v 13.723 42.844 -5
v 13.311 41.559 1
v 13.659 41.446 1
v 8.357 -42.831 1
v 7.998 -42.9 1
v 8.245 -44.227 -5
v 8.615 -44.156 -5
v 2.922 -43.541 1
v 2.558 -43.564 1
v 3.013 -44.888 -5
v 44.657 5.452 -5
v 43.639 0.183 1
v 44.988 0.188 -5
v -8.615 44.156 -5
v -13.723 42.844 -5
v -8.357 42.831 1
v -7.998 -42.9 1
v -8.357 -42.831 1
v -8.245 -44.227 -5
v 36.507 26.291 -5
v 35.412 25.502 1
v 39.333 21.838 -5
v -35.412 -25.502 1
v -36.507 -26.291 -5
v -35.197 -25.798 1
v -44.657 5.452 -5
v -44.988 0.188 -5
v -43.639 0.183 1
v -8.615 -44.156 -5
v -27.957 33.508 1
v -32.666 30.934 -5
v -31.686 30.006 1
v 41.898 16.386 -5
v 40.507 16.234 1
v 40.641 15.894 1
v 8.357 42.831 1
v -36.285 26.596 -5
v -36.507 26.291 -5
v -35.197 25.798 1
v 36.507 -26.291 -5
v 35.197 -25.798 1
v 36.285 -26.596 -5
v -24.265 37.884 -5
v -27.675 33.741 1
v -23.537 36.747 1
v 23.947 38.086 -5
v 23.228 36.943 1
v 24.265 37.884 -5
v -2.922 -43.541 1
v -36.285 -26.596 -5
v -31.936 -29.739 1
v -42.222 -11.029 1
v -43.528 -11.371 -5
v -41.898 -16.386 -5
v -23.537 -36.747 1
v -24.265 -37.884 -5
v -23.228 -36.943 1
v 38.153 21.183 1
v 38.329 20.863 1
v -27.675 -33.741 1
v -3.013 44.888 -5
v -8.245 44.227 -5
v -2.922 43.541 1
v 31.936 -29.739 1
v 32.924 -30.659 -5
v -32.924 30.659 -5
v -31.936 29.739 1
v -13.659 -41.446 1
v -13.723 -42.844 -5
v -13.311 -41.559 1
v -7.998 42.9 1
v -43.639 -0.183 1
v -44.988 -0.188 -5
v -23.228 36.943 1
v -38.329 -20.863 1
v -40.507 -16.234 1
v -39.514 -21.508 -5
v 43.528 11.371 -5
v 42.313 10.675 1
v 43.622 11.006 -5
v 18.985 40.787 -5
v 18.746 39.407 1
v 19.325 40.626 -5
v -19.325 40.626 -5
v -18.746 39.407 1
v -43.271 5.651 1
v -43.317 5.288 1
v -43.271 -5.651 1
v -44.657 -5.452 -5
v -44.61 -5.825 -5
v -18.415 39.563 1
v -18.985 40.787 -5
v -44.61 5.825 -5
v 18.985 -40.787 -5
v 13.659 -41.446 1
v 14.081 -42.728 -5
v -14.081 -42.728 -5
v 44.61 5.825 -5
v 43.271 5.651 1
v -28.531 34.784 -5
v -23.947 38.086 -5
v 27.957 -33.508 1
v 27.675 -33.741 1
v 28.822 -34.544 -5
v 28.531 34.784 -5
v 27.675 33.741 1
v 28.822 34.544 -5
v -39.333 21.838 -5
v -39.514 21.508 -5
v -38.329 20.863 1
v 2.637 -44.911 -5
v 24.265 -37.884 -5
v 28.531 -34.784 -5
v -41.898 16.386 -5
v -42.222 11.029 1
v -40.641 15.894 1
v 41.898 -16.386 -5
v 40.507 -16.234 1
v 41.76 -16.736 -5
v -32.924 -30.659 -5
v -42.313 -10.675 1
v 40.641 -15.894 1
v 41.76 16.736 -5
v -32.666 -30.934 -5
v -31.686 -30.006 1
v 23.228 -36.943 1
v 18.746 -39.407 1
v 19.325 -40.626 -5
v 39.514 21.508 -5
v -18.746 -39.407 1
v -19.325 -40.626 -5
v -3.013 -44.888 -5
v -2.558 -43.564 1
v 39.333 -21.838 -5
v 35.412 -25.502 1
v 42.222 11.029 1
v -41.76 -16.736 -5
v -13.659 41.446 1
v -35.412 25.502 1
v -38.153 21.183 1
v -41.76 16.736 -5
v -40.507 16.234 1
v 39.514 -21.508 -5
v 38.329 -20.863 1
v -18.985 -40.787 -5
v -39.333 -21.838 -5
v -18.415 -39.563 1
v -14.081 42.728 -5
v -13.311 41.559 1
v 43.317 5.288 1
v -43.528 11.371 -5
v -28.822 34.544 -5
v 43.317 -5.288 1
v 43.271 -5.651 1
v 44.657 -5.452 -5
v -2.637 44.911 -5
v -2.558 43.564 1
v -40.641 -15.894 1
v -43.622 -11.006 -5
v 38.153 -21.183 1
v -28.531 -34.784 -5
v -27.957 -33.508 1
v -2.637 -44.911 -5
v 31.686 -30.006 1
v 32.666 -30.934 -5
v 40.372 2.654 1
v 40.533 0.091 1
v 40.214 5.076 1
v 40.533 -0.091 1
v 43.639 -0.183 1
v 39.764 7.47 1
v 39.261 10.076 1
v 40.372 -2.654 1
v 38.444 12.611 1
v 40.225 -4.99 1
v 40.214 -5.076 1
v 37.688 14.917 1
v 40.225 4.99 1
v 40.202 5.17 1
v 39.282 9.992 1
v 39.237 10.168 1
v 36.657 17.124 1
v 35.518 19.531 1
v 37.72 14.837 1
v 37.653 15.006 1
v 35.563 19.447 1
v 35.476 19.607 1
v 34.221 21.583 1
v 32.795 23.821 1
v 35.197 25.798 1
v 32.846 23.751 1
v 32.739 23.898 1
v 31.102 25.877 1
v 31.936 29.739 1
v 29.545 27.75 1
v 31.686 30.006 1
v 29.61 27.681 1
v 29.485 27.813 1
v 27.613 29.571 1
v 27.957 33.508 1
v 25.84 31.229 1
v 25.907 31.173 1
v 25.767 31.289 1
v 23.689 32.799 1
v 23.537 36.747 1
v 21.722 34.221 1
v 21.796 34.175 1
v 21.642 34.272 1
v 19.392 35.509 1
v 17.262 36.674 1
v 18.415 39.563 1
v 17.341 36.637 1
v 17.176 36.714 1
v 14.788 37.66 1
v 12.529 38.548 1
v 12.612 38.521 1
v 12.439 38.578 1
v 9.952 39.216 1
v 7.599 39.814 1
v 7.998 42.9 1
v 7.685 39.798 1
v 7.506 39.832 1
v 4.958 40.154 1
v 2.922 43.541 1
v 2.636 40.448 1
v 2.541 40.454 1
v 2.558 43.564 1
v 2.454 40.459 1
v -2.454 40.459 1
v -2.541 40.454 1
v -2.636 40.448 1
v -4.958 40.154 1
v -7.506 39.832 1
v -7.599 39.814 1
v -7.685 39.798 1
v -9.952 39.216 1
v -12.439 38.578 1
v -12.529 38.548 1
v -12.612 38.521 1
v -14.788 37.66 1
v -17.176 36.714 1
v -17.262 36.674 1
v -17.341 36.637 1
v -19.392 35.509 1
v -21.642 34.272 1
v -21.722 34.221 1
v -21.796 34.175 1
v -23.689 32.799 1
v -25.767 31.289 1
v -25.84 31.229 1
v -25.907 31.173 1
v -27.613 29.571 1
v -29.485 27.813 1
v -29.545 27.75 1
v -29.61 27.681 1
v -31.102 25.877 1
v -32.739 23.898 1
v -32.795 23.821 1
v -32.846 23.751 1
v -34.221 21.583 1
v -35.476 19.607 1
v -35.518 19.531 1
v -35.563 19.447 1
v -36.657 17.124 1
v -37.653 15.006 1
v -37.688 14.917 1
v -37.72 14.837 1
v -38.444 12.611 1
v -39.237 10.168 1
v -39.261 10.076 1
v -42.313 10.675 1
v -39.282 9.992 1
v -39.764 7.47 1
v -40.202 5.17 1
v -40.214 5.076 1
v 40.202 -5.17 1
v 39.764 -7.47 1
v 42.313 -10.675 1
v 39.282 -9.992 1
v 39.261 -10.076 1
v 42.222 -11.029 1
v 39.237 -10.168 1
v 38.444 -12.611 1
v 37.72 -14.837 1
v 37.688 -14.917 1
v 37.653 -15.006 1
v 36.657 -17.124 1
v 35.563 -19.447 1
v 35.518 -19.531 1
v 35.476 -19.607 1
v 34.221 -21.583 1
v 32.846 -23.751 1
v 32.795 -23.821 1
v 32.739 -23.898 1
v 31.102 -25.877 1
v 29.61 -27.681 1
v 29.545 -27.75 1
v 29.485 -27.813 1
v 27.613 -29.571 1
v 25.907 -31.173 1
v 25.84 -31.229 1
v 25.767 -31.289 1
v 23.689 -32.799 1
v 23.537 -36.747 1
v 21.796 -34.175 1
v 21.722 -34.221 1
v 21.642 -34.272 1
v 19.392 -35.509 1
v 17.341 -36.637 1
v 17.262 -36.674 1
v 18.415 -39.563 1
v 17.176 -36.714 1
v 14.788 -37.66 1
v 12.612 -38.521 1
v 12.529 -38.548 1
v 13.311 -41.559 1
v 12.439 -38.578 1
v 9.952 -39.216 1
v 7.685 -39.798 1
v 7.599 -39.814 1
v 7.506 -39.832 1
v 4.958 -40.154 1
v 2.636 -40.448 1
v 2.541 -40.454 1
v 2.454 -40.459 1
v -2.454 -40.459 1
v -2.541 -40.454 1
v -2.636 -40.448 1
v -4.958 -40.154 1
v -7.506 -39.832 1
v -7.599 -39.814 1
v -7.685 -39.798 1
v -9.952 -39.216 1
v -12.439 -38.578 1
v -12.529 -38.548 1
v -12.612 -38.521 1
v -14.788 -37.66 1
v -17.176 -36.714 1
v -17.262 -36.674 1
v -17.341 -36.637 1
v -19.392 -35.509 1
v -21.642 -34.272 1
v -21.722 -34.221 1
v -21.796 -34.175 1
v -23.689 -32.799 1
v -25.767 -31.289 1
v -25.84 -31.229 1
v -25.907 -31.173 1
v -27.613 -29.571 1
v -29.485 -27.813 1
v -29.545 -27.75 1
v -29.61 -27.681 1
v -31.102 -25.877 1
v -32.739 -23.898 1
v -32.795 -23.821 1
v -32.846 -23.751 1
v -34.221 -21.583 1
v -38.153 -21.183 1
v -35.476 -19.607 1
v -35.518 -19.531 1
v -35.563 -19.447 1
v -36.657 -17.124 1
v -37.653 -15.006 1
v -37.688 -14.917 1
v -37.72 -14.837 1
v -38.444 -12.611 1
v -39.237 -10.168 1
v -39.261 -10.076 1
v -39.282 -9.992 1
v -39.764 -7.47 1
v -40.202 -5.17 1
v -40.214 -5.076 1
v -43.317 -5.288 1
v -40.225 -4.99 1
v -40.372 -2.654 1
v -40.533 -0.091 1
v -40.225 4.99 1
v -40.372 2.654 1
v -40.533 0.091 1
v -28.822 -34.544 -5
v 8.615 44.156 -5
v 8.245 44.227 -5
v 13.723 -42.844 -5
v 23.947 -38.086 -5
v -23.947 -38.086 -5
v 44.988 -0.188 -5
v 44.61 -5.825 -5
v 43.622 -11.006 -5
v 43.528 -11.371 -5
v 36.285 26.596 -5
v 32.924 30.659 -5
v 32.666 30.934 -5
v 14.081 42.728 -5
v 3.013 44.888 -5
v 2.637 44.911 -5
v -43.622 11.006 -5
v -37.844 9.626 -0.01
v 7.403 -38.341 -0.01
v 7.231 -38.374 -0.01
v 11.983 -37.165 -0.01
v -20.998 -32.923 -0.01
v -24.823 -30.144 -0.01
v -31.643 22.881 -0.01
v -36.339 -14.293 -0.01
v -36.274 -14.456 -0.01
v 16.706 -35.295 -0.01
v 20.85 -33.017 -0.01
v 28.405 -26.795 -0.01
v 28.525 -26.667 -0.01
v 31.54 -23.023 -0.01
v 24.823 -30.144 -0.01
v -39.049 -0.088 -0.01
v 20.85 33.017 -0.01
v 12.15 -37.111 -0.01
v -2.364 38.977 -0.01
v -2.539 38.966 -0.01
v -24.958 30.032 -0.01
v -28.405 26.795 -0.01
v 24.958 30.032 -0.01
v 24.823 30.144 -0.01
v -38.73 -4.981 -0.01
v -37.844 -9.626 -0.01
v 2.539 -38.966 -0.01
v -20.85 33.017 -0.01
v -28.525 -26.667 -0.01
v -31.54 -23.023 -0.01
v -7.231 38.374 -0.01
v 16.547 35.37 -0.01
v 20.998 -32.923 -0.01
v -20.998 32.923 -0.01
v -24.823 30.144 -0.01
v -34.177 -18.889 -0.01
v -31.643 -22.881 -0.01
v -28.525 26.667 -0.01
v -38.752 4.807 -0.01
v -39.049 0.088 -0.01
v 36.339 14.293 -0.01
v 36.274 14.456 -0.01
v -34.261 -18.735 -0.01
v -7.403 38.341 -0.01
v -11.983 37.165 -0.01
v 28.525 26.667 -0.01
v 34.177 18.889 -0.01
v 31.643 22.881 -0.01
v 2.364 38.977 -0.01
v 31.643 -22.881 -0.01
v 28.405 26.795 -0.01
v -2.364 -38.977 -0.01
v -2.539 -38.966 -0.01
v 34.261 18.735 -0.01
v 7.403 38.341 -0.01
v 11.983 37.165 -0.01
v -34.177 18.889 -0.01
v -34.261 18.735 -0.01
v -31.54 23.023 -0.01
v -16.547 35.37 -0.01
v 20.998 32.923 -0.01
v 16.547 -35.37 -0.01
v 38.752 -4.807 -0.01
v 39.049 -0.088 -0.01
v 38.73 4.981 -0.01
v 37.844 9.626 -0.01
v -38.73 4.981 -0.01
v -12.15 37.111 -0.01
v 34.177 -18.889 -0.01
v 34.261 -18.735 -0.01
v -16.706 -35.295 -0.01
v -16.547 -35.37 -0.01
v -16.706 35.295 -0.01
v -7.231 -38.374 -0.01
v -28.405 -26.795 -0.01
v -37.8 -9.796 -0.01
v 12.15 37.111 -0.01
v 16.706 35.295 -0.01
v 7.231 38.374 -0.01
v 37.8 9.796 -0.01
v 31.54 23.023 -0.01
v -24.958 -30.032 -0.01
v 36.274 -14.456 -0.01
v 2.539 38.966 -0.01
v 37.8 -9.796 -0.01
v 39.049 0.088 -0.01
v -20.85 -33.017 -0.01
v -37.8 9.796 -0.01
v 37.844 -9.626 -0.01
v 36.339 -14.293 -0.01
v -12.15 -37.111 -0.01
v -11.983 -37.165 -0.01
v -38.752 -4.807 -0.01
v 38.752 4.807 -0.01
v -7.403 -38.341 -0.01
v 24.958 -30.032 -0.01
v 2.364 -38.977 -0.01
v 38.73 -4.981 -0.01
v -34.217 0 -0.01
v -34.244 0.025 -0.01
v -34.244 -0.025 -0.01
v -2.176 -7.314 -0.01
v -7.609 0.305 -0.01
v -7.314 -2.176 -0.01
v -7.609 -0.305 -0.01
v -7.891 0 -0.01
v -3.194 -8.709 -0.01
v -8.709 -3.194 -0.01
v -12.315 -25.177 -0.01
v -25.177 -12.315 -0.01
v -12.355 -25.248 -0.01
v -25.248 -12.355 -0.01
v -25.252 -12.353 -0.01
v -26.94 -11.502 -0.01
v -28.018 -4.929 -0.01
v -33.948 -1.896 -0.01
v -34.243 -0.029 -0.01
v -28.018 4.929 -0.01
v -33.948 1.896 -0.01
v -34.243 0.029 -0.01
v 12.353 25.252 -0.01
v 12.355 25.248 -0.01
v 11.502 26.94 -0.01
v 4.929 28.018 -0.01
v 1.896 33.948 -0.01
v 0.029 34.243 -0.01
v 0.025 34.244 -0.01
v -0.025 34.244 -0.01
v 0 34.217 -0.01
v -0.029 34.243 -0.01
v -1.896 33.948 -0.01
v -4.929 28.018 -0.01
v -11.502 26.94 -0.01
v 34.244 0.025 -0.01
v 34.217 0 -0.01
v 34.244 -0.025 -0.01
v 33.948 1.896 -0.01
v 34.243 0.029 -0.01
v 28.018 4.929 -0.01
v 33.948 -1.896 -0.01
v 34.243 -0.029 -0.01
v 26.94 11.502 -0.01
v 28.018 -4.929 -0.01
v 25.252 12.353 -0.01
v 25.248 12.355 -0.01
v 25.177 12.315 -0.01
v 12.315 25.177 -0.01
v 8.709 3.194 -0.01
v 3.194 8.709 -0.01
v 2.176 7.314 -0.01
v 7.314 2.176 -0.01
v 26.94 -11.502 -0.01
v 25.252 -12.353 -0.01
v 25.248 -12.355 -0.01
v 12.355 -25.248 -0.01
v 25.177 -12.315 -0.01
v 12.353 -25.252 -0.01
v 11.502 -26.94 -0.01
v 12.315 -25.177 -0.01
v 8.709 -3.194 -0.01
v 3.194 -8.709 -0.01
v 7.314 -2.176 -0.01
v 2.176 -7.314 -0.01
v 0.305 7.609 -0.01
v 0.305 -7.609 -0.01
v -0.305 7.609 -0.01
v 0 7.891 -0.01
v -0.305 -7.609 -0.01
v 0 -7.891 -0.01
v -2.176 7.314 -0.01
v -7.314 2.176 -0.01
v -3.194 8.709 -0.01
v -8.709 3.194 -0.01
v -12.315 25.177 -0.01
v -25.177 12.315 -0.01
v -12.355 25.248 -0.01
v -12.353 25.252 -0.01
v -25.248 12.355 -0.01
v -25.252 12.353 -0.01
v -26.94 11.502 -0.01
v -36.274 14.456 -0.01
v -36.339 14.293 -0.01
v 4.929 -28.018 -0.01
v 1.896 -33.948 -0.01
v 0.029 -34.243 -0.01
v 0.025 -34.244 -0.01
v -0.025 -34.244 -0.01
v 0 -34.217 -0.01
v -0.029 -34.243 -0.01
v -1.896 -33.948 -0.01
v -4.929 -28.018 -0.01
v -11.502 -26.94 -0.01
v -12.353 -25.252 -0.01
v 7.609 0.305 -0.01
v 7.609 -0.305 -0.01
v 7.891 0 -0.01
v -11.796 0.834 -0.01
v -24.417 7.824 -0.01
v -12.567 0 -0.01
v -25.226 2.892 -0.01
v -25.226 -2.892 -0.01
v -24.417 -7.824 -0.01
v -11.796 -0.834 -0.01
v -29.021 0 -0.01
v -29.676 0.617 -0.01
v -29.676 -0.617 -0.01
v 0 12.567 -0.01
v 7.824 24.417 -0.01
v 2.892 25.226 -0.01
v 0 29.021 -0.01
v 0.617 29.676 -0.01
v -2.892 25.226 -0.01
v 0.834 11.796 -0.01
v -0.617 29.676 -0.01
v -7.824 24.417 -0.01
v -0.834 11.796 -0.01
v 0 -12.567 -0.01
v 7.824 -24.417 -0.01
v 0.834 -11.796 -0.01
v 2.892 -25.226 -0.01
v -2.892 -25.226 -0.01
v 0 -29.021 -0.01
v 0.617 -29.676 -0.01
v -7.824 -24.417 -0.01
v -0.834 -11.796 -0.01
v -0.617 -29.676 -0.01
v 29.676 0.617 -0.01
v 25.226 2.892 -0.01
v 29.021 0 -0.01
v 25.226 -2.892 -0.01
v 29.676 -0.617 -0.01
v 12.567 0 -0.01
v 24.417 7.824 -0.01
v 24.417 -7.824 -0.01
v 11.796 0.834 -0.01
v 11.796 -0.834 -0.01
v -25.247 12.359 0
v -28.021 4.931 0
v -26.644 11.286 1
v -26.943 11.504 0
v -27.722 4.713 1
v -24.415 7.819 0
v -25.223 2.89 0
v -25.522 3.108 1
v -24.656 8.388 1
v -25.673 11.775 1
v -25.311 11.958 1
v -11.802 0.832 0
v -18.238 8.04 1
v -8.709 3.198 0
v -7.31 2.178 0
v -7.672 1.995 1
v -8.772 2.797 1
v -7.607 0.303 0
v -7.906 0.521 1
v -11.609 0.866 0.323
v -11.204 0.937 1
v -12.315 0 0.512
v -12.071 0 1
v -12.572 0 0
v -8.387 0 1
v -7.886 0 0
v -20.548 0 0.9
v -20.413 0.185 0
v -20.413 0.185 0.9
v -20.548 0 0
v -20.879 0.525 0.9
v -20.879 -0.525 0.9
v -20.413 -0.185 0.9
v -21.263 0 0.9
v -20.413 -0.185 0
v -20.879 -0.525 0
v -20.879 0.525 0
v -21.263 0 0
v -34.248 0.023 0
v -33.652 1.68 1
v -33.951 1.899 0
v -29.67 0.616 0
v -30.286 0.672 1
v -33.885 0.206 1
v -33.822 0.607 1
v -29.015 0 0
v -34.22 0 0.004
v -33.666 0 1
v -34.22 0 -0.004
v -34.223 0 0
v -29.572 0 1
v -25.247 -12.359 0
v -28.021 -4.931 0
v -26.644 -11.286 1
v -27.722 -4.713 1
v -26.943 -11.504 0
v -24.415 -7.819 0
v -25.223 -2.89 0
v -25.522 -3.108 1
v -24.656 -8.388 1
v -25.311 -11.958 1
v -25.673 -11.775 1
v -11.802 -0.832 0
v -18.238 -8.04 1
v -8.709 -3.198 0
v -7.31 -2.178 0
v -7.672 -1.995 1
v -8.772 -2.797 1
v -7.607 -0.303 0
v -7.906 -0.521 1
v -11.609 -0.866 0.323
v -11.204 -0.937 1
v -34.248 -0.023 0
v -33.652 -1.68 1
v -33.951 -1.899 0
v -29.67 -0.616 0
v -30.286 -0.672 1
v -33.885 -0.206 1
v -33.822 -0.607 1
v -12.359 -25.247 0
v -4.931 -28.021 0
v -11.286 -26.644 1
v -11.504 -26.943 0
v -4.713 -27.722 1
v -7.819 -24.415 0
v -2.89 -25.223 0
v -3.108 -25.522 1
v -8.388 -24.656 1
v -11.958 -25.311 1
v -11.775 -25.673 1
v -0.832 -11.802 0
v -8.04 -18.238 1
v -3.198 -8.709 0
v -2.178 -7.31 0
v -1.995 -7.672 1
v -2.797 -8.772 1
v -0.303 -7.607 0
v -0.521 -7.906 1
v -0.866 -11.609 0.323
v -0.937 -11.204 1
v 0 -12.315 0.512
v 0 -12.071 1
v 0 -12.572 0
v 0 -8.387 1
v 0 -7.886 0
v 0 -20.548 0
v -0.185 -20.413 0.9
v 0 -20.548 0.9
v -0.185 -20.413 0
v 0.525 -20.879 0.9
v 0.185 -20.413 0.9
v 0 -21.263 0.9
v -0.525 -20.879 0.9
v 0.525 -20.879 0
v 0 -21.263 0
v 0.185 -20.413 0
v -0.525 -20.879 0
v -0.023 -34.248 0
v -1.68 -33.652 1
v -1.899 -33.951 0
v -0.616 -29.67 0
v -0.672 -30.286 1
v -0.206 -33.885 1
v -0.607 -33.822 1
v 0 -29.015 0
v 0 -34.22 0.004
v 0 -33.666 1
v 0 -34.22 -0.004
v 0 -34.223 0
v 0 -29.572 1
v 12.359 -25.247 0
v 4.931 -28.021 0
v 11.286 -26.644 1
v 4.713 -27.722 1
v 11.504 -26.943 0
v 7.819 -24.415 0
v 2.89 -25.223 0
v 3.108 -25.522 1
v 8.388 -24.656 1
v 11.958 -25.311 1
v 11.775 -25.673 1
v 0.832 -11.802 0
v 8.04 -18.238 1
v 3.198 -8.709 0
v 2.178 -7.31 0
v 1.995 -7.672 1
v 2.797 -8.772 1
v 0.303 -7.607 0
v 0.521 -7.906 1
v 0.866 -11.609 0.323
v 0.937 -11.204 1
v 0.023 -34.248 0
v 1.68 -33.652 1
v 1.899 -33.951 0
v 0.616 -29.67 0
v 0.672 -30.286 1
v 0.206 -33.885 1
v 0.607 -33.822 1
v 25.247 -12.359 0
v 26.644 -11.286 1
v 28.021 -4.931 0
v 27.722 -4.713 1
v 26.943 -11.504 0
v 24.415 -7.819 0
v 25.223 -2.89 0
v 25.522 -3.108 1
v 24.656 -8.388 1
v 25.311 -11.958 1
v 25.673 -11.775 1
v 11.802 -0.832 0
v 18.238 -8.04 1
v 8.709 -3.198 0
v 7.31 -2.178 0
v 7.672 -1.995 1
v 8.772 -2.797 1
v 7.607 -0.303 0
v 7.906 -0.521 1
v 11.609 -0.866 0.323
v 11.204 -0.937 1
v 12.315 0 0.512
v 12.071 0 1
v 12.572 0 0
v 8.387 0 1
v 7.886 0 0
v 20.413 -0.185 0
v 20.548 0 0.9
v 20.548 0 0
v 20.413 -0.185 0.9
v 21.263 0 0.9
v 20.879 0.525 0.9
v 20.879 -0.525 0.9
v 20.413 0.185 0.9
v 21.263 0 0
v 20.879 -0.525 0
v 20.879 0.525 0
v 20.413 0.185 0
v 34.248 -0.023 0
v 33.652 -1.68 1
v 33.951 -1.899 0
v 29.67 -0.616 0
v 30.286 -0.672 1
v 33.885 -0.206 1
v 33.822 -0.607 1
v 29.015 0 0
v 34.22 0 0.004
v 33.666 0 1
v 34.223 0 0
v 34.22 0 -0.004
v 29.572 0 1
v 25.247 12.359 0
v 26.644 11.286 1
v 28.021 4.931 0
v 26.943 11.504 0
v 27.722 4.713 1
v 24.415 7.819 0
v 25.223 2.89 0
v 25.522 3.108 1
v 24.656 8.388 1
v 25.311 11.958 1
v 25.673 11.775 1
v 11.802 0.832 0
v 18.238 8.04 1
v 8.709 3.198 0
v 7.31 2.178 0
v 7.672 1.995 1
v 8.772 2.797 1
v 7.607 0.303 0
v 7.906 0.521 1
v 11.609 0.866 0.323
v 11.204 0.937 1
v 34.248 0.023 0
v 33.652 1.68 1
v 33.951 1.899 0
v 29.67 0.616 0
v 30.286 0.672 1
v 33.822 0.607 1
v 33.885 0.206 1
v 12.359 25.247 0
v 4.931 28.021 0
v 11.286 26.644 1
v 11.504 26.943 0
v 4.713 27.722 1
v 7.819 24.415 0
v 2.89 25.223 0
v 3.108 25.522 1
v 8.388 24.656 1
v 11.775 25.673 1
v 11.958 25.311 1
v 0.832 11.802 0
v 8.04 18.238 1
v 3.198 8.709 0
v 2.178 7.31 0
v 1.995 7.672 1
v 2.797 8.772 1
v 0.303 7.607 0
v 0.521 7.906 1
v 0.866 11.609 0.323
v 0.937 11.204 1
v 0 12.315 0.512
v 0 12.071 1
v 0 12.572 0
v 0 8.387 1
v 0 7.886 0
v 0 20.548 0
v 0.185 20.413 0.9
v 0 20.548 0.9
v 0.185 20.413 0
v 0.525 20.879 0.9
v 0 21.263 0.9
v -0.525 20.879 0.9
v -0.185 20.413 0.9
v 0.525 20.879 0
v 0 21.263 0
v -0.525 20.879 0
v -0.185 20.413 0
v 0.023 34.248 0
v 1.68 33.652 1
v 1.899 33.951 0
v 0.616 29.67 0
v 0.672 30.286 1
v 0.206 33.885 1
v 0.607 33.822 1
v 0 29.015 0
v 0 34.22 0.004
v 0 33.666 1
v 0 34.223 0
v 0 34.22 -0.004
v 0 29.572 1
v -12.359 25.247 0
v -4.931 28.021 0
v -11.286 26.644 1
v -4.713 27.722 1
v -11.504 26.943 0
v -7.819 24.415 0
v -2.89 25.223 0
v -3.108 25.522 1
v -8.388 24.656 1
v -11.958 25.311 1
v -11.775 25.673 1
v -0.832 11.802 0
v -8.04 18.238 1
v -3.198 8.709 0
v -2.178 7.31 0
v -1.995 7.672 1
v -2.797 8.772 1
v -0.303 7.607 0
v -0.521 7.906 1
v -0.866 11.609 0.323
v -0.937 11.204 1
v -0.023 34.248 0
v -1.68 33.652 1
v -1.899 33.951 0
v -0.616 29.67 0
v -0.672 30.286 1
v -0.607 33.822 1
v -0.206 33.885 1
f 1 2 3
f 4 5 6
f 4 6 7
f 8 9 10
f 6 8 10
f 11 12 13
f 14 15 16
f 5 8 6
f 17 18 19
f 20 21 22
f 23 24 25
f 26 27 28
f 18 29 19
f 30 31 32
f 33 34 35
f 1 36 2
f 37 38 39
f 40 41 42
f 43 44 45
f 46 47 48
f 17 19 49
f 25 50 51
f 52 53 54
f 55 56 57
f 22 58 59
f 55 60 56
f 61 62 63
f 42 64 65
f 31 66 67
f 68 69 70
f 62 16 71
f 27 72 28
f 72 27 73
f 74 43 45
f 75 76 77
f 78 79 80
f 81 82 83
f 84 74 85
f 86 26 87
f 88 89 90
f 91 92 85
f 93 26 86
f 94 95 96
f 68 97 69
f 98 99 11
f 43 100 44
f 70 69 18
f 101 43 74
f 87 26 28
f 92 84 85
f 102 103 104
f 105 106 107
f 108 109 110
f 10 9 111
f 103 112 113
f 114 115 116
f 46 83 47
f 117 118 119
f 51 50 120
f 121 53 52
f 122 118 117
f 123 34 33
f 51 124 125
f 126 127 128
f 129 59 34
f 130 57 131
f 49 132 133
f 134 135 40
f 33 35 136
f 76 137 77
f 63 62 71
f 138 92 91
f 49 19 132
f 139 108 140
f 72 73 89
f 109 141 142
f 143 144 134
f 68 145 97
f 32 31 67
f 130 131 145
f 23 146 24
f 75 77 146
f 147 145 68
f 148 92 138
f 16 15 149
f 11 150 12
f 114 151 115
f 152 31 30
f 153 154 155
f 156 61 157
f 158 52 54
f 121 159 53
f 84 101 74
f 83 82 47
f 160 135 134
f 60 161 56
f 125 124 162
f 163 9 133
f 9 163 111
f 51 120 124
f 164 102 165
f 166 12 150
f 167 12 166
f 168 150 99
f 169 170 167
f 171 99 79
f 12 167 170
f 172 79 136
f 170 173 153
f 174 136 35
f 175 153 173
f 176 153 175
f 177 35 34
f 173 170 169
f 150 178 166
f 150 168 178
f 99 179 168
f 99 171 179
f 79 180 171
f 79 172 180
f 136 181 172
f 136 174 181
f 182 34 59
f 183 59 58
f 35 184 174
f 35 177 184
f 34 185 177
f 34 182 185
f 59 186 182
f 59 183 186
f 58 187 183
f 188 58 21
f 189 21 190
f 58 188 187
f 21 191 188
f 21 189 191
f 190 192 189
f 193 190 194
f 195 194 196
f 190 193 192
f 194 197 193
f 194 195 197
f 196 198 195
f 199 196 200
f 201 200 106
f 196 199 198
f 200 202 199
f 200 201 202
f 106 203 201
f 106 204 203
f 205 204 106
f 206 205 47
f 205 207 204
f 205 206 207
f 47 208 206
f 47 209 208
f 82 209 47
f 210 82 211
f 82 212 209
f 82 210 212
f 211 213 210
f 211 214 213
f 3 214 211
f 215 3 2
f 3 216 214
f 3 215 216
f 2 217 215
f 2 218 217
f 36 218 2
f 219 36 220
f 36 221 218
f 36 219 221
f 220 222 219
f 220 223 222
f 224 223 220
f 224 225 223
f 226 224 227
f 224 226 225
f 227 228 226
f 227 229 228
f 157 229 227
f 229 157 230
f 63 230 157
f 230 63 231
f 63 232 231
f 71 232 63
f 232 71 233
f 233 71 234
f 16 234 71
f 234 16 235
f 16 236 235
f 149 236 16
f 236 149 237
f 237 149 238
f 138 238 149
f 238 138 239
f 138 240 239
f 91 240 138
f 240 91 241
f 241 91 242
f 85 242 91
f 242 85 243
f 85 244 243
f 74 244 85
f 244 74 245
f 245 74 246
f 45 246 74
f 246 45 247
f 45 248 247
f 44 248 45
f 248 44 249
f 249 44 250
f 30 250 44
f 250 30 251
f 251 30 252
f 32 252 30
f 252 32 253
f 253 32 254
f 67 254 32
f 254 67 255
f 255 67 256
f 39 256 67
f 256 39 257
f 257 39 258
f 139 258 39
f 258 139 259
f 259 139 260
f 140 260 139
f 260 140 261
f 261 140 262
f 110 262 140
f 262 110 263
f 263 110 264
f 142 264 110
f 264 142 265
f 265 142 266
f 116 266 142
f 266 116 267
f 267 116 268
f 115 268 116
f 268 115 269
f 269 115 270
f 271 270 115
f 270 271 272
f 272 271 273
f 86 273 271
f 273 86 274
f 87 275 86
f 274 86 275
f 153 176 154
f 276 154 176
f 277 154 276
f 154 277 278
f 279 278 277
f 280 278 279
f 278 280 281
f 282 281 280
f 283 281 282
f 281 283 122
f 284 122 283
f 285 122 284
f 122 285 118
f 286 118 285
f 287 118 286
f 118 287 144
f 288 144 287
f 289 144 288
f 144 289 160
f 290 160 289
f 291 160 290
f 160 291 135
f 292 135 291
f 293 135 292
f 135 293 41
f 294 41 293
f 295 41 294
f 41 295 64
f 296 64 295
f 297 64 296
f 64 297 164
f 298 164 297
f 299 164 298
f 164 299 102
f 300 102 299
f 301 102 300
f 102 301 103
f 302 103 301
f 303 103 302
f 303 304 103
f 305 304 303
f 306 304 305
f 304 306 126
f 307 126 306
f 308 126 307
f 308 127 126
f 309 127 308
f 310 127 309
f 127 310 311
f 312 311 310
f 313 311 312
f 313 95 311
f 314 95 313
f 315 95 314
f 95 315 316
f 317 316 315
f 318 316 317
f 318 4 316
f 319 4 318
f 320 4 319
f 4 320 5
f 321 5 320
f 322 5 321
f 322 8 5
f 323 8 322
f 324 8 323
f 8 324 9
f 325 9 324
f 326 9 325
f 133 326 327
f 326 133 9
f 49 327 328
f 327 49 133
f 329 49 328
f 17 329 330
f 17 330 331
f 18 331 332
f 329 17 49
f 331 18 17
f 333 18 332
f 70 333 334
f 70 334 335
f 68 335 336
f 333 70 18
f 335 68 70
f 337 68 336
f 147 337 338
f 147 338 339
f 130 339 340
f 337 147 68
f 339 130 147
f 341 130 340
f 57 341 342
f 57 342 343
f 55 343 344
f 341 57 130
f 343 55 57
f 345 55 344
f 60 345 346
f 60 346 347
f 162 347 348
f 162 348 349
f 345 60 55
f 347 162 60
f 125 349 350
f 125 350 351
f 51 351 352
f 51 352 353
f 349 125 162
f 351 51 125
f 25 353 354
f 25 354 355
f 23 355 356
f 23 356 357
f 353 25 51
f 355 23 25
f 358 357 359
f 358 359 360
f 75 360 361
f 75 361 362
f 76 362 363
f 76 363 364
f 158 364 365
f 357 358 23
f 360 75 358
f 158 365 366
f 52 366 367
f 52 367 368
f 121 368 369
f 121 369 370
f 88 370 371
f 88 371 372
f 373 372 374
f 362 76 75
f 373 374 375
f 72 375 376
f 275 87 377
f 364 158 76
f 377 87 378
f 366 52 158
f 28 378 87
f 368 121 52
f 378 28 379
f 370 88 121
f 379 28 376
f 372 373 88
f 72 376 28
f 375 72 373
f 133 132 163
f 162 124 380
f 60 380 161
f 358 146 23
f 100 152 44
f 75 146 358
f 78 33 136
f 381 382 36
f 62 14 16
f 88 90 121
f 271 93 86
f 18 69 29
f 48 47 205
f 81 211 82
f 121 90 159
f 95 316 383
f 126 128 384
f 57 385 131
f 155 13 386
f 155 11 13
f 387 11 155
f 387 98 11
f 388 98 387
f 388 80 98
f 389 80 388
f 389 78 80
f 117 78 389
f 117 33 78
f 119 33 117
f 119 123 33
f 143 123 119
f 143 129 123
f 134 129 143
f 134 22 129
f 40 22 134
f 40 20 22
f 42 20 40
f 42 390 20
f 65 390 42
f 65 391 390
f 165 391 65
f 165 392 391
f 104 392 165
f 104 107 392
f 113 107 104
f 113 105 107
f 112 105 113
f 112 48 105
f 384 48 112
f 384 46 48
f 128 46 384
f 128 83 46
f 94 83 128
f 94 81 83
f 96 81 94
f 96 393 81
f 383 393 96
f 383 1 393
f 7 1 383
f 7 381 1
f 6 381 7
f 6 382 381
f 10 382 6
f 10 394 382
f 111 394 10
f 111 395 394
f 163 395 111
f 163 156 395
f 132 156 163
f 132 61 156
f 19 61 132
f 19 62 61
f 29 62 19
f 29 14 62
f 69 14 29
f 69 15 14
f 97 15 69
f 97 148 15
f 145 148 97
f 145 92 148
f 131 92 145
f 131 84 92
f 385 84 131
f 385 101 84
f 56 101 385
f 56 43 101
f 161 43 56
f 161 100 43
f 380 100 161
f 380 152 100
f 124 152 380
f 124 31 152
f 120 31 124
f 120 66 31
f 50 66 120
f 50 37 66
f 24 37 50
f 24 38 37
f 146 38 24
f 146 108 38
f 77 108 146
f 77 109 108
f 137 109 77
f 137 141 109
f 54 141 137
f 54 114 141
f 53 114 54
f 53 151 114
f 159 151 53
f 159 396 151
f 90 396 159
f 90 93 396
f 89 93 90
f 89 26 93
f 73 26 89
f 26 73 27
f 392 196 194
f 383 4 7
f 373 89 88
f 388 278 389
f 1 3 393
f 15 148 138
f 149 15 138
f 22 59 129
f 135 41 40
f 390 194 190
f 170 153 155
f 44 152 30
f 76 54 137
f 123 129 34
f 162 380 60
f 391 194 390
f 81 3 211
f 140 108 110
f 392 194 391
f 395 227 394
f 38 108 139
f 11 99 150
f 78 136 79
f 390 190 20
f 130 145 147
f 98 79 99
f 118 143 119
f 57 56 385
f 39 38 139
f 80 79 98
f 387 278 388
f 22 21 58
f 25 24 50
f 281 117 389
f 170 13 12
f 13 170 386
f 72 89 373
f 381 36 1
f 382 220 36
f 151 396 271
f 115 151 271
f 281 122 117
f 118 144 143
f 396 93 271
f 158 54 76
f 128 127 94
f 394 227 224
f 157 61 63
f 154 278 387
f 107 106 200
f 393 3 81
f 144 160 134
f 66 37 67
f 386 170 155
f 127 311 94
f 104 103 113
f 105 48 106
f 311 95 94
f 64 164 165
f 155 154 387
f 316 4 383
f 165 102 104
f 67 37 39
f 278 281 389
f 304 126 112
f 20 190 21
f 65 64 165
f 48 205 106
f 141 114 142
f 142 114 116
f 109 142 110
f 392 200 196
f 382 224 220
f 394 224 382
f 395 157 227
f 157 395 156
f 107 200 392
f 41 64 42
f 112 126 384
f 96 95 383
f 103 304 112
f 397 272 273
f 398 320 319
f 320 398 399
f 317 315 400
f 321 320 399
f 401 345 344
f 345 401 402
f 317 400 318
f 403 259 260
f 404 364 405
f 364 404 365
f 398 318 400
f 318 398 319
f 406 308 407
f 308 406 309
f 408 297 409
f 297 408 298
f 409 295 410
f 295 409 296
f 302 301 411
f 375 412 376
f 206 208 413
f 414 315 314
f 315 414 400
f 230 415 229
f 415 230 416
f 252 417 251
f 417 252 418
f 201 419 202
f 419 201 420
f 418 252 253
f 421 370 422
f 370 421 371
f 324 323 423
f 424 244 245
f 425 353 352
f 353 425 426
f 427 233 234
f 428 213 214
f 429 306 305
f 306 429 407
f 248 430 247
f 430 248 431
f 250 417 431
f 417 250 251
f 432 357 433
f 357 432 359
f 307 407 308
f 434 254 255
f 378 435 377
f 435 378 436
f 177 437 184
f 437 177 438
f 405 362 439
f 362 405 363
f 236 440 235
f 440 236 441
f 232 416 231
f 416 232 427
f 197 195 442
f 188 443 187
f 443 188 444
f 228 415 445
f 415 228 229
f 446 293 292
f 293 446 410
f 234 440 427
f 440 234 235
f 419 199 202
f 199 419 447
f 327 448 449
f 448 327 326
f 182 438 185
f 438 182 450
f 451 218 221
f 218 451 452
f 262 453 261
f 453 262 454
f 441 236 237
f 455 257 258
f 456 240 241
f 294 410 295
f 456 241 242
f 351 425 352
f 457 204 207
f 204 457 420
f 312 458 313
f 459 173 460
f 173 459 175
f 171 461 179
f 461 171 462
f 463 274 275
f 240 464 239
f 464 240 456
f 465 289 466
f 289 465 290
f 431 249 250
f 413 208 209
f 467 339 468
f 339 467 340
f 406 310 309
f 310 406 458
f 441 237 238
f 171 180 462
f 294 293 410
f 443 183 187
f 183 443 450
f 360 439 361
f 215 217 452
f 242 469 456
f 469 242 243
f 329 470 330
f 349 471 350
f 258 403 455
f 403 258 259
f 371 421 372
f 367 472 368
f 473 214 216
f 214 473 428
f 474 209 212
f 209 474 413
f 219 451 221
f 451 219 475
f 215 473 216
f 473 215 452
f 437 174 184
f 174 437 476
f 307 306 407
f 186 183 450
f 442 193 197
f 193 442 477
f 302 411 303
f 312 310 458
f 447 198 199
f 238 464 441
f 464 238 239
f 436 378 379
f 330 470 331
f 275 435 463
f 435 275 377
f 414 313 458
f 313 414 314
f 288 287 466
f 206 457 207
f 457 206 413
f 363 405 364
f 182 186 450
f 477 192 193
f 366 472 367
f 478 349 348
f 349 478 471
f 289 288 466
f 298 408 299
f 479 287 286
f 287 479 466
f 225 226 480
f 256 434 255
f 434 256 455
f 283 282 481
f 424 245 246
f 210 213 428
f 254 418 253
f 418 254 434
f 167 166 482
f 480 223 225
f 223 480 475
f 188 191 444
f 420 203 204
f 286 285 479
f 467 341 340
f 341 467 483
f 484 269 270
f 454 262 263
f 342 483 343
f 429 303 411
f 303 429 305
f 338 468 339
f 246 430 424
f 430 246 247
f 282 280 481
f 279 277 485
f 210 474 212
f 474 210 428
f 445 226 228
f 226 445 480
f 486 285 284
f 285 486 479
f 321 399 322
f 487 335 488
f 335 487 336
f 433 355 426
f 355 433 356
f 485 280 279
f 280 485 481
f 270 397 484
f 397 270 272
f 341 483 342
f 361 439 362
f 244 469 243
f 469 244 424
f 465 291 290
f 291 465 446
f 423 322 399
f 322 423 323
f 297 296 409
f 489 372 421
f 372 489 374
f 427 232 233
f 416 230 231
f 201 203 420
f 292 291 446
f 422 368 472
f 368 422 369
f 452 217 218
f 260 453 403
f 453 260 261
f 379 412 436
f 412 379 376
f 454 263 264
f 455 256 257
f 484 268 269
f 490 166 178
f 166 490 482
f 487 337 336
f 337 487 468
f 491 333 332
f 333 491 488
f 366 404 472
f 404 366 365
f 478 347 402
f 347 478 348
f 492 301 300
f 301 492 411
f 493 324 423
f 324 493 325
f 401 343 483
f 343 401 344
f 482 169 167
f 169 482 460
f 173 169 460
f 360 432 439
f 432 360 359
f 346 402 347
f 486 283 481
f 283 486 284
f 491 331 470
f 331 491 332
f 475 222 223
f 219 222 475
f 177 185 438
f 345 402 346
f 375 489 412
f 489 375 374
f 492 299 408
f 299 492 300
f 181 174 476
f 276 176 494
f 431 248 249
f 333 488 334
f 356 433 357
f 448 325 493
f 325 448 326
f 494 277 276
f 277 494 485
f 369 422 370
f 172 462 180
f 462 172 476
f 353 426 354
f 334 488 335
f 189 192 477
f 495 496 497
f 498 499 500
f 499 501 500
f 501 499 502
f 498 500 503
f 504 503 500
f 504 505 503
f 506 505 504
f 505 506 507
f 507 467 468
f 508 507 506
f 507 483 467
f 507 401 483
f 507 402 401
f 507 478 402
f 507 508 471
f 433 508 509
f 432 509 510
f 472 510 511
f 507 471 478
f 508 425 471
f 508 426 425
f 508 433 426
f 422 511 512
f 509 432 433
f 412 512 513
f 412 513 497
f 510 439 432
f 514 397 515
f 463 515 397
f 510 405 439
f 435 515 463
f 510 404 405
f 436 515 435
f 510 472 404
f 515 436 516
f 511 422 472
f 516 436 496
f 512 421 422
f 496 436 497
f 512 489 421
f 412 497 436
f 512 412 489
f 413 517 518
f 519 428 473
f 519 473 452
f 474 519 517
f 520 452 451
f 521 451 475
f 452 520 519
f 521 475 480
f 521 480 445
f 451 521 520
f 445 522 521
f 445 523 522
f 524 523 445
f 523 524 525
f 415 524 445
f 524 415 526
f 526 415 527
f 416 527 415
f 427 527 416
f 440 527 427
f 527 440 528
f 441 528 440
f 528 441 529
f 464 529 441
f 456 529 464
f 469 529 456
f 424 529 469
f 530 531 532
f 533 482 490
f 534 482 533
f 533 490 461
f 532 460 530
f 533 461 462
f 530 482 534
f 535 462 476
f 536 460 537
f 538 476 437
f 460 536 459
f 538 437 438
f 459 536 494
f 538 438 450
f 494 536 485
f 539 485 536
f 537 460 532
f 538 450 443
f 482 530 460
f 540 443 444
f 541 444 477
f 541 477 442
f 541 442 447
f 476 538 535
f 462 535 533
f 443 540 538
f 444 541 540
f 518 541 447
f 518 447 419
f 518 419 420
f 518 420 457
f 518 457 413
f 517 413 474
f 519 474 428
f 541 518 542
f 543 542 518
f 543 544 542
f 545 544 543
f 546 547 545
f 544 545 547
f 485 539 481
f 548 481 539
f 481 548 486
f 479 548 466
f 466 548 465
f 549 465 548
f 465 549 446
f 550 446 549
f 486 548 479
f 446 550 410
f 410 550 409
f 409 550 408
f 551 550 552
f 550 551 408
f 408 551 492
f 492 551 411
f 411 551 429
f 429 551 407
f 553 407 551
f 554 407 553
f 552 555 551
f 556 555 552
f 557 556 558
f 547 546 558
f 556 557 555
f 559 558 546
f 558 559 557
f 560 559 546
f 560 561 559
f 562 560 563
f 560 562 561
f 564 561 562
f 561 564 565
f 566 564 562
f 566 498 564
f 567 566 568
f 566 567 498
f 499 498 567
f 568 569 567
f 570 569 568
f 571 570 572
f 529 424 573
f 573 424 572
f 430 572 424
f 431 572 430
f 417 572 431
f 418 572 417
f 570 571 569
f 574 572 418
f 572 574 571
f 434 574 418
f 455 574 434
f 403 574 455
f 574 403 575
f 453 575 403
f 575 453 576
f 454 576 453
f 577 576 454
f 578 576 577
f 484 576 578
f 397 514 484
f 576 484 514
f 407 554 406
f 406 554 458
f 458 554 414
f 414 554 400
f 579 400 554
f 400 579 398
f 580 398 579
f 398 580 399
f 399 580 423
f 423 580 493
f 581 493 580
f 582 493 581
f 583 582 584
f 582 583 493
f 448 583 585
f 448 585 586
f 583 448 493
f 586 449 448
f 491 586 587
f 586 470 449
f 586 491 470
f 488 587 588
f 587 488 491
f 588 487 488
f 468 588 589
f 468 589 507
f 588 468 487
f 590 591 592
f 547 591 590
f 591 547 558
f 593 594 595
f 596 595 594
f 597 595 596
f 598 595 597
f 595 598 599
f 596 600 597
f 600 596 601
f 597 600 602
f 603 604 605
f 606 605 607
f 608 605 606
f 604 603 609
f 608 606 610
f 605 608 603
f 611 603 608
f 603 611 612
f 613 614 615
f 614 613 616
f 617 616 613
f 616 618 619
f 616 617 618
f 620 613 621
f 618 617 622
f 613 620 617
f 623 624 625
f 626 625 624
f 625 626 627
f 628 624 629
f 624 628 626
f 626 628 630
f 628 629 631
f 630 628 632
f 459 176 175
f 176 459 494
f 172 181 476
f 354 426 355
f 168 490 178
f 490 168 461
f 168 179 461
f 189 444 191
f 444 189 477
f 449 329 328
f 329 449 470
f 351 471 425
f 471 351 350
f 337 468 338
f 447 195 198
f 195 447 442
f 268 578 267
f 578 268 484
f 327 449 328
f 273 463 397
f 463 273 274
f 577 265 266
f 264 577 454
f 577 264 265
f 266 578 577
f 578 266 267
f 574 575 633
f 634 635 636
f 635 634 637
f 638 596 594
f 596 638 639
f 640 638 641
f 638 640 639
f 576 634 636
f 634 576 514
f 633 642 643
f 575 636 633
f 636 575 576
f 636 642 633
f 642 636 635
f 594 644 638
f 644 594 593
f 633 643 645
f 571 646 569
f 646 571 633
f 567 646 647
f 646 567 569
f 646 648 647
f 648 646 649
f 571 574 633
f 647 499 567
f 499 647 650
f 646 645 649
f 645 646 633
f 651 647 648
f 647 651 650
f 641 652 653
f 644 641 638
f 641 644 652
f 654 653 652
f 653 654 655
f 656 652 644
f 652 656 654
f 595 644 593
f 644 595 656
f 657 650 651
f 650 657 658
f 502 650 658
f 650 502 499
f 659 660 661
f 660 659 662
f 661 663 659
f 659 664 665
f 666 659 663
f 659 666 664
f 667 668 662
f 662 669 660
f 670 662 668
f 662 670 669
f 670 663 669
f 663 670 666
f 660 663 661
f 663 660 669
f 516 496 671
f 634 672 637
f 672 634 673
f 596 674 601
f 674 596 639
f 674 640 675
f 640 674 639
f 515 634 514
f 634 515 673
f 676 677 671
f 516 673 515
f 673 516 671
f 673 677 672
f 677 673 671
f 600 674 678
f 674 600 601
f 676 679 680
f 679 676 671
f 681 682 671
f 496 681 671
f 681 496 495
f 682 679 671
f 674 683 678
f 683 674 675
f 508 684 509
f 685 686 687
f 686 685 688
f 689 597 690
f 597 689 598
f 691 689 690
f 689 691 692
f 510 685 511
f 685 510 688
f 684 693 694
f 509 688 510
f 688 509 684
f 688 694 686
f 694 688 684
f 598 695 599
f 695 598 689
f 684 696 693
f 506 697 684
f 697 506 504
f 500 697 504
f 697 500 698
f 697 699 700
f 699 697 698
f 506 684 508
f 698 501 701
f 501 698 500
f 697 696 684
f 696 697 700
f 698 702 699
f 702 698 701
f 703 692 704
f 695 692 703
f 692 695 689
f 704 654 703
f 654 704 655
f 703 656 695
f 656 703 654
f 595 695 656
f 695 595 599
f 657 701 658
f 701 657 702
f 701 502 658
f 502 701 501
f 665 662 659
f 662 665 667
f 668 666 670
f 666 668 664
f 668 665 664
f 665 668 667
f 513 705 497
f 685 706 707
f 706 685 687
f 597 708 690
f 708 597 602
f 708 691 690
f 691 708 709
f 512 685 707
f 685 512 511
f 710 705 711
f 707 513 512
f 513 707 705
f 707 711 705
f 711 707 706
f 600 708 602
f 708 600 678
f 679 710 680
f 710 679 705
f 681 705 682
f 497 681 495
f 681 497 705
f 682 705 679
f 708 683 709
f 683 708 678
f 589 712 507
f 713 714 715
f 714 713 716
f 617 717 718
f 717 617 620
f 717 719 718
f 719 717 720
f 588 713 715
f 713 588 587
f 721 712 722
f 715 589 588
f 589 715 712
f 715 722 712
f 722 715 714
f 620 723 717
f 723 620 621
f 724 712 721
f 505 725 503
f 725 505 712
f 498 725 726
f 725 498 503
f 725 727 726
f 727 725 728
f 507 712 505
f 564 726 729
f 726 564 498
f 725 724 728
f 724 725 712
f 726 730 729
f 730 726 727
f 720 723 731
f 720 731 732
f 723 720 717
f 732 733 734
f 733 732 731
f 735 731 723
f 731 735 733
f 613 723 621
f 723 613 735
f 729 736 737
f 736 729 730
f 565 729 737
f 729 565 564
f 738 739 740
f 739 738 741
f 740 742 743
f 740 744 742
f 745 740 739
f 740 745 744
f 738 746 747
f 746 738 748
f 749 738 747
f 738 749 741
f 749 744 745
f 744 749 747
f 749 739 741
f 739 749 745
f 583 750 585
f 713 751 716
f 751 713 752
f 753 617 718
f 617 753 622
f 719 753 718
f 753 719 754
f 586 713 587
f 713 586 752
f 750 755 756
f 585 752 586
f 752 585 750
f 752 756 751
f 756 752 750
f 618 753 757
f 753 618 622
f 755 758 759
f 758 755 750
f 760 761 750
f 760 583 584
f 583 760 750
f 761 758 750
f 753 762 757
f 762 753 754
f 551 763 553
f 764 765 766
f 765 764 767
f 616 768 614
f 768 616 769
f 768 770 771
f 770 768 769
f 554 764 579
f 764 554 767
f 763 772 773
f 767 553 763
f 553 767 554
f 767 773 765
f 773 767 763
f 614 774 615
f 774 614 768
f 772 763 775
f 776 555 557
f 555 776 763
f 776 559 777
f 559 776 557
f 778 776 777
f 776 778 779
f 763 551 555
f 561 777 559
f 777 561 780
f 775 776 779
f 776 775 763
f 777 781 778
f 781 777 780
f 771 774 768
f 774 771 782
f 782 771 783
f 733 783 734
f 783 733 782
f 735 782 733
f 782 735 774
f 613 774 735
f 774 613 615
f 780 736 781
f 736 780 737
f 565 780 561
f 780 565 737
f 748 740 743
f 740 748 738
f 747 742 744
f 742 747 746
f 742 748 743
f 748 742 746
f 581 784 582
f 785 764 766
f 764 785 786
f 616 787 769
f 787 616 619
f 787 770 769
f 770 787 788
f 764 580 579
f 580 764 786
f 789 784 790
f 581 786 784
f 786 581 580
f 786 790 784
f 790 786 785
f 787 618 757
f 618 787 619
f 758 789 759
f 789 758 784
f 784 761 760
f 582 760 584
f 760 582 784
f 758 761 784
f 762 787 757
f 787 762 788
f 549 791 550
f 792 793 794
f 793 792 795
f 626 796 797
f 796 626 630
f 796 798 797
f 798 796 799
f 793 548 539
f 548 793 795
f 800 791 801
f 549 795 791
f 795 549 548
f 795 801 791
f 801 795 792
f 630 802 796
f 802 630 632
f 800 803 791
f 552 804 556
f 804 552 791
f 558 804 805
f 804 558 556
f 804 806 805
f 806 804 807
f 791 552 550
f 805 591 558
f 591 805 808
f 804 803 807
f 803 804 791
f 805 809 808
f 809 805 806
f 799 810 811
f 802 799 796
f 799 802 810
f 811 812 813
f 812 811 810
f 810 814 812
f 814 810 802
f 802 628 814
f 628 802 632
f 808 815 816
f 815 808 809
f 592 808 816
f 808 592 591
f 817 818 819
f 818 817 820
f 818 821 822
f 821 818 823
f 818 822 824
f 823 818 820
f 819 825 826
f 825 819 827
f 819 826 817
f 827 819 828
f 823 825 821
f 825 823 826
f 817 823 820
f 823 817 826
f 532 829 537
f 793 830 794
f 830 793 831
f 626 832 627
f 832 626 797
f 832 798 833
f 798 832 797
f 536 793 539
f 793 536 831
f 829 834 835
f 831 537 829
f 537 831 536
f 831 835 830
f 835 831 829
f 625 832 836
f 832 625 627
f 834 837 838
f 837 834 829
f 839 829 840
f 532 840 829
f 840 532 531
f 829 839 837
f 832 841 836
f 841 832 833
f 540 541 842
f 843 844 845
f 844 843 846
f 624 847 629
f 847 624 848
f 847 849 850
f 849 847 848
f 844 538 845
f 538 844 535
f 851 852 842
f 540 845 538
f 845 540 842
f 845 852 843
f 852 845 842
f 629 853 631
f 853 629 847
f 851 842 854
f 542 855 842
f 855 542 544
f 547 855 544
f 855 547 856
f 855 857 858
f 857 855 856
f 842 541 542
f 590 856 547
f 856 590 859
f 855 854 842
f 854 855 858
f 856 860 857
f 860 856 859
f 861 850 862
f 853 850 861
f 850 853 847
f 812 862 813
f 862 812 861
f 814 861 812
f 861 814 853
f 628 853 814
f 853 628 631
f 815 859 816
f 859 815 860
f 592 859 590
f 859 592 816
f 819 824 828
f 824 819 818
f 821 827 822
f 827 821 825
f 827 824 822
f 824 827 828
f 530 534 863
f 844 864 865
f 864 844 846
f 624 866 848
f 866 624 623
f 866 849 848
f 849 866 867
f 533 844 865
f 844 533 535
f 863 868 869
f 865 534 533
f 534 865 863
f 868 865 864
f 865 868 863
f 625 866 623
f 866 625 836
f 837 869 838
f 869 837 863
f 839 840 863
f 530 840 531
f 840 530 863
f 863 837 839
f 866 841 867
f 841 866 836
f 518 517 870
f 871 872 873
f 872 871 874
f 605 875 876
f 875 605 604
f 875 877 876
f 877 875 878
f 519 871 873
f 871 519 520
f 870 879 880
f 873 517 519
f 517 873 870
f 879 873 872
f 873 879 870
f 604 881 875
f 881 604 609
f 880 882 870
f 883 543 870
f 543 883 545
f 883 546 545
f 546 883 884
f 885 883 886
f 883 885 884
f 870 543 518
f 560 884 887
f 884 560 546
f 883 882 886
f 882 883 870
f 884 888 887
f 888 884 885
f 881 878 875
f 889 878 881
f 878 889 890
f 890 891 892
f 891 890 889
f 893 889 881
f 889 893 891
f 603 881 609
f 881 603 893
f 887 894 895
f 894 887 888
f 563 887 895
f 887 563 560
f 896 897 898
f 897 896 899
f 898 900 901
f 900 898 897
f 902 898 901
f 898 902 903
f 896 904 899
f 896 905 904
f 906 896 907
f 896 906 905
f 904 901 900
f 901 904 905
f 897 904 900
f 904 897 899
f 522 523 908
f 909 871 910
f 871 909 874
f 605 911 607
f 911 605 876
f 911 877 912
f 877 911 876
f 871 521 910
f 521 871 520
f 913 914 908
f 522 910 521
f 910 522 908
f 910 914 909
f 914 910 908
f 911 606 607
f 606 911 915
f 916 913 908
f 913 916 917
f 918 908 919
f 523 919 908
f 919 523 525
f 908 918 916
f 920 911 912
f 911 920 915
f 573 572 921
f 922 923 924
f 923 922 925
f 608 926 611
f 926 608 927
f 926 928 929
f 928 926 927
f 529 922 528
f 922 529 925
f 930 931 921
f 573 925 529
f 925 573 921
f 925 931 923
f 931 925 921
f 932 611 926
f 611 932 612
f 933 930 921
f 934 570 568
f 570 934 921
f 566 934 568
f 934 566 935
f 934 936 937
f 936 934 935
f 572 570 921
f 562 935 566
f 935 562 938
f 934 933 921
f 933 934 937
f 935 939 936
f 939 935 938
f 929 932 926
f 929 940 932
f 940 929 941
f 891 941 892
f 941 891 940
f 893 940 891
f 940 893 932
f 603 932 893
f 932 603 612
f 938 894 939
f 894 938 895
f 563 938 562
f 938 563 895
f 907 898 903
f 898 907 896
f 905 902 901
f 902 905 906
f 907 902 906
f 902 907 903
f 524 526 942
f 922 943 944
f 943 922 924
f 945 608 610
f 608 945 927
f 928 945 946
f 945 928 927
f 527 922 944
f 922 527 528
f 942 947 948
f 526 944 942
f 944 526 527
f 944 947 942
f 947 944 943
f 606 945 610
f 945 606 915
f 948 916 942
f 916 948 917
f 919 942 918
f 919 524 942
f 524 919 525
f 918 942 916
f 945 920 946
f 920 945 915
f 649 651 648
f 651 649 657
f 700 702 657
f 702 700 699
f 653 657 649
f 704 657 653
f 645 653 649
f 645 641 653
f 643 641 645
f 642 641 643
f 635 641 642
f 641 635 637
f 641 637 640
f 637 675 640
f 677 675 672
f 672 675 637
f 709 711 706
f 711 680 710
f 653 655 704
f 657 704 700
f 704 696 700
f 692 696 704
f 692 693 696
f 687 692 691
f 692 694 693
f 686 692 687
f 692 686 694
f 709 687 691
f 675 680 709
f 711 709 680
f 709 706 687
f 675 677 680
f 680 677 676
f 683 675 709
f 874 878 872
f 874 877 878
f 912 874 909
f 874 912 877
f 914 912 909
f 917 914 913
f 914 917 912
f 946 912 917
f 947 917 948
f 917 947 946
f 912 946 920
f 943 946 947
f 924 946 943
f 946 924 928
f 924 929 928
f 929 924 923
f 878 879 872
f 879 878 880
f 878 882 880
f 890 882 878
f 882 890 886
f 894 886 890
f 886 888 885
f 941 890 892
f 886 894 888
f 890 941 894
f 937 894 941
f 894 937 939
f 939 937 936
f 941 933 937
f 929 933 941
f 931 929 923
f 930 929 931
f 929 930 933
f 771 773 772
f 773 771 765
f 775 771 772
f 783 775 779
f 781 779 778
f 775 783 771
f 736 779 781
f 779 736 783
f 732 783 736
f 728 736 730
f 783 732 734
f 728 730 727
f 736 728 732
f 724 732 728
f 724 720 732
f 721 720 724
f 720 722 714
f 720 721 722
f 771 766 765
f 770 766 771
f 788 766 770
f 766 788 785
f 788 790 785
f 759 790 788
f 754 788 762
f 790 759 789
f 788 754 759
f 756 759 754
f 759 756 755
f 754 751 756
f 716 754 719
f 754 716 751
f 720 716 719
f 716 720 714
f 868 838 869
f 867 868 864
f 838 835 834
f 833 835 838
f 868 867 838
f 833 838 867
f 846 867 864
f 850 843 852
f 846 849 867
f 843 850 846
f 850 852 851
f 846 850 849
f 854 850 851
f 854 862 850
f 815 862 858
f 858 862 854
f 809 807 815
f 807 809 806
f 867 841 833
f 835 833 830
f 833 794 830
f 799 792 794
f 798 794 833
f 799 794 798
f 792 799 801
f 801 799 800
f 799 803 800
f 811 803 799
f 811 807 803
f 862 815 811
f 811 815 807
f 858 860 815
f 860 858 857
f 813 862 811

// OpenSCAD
Seed=6547648057;//
Seeded=0;//[1,0]

Oscale=[0.9,0.9];//
plate=45;//
thickness=5;
/*[Hidden]*/
baser=rnd(Seed+1,1.4,2);
phase=rnd(Seed+2,360);

mag1=rnd(Seed+3,6)*baser;
rep1=round(rnd(Seed+4,0,8));
ophase1=rnd(Seed+5,360);

mag2=rnd(Seed+6,6)*baser;
rep2=round(rnd(Seed+7,3,10));
ophase2=rnd(Seed+8,360);

phase0=rnd(Seed+9,360);
r0=rnd(Seed+10,0,1);
phase1=rnd(Seed+1,360);
r1=rnd(Seed+11,0,1)/2;
phase2=rnd(Seed+1,360);
r2=rnd(Seed+12,0,1)/3;
phase3=rnd(Seed+1,360);
r3=rnd(Seed+13,0,1)/4;
phase8=rnd(Seed+1,360);
r8=rnd(Seed+14,0,1)/8;
rsym1=round(rnd(Seed+15,1,8));
rsym2=round(rnd(Seed+16,0,rnd(Seed+16,16)));
msym1=round(rnd(Seed+17,0,rsym1));
msym2=round(rnd(Seed+18,0,rsym2));
rsum=baser+r0+r1+r2+r3+r8;
step=24*rsym1;
d=rnd(Seed+19,360);
e=rnd(Seed+20,-0.1,0.1);

dir=[rnd(Seed+21,-0,-0.5,Seed-23),0.5,0]*10;
golds=["DarkGoldenrod","Goldenrod"];
difference(){
color("DarkGoldenrod")translate([0,0,-thickness]) linear_extrude(height = thickness +1,  convexity = 10, scale=0.97,$fn=50)offset(r=3, chamfer=true)offset(r=-3, chamfer=false) circle(plate,center=true);
color("Goldenrod")mirror([0,0,1])translate([0,0,-1.99]) linear_extrude(height = 2,  convexity = 10, scale=0.93,$fn=50)offset(delta=3, chamfer=true)offset(r=-6, chamfer=false) circle(plate,center=true);
}

up=[0,0,-2];
intersection(){
color("DarkGoldenrod")translate([0,0,-thickness]) linear_extrude(height = thickness +1,  convexity = 10, scale=0.97,$fn=50)offset(r=3, chamfer=true)offset(r=-3, chamfer=false) circle(plate,center=true);

color("DarkGoldenrod")translate([0,0,0]) scale([Oscale[0]*plate,Oscale[1]*plate,30]) symmetries(rsym1,msym1){translate([-0.7+0.7/rsym1,0,0])rotate([0,0,d])scale([0.3+0.7/rsym1,e+0.3+0.7/rsym1,1])symmetries(rsym2,msym2){it ();};
}
}
//symmetries(rsym2,msym2){it ();}
module symmetries(rsym,msym){
for(j=[0:360/rsym:360])rotate([0,0,j]){
intersection(){
if(msym==0) children ();else union(){
    intersection(){
    children ();
    translate([-1,0,-0.05])scale([2,1,0.2])cube(1);
    }
    mirror([0,1,0]) intersection(){
    children ();
    translate([-1,0,-0.05])scale([2,1,0.2])cube(1);
    }}

if(rsym>1){intersection(){
rotate ([0,0,(360/rsym)*0.5])translate([-1,0,-0.05])scale([2,1,0.2])cube(1);
mirror([0,1,0])rotate ([0,0,(360/rsym)*0.5])translate([-1,0,-0.05])scale([2,1,0.2])cube(1);
}}else {scale([1,1,0.2])cube(2,center=true);
}
}}}

module it(){
cube(0.03,$fn=10);
for(i=[0:step:360]){hull(){
theta = i+ sin((i+ophase1)*rep1)*mag1+ sin((i+ophase2)*rep2)*mag2;
translate([
sin(theta+phase)*(baser+sin((i+phase0))*r0 +sin((i+phase1)*2)*r1+sin((i+phase2)*3)*r2+sin((i+phase3)*4)*r3+sin((i+phase8)*8)*r8)/rsum
,
cos(theta+phase)*(baser+sin((i+phase0))*r0+sin((i+phase1)*2)*r1+sin((i+phase2)*3)*r2+sin((i+phase3)*4)*r3+sin((i+phase8)*8)*r8)/rsum
,0

])sphere(0.09,$fn=6 );
ii=(i+step)%360;
theta2 = ii+ sin((ii+ophase1)*rep1)*mag1+ sin((ii+ophase2)*rep2)*mag2;
translate([
sin(theta2+phase)*(baser+sin((ii+phase0))*r0 +sin((ii+phase1)*2)*r1+sin((ii+phase2)*3)*r2+sin((ii+phase3)*4)*r3+sin((ii+phase8)*8)*r8)/rsum
,
cos(theta2+phase)*(baser+sin((ii+phase0))*r0+sin((ii+phase1)*2)*r1+sin((ii+phase2)*3)*r2+sin((ii+phase3)*4)*r3+sin((ii+phase8)*8)*r8)/rsum
,0

])sphere(0.09,$fn=6 );
}}}

 
function rndR()=[rands(0,360,1)[0],rands(0,360,1)[1],rands(0,360,1)[0]];

function un(v)=v/max(len3(v),0.000001)*1;
function p2n(pa,pb,pc)=
let(u=pa-pb,v=pa-pc)un([u[1]*v[2]-u[2]*v[1],u[2]*v[0]-u[0]*v[2],u[0]*v[1]-u[1]*v[0]]);
function avrg(v)=sumv(v,max(0,len(v)-1))/len(v);
function lerp(start,end,bias)=(end*bias+start*(1-bias));
function len3(v)=len(v)==2?sqrt(pow(v[0],2)+pow(v[1],2)):sqrt(pow(v[0],2)+pow(v[1],2)+pow(v[2],2));
function sumv(v,i,s=0)=(i==s?v[i]:v[i]+sumv(v,i-1,s));
function rnd(S,a=0,b=1)=Seeded==1?(rands(min(a,b),max(a,b),1,S)[0]):(rands(min(a,b),max(a,b),1)[0]);
function rndc()=[rands(0,1,1)[0],rands(0,1,1)[0],rands(0,1,1)[0]];
